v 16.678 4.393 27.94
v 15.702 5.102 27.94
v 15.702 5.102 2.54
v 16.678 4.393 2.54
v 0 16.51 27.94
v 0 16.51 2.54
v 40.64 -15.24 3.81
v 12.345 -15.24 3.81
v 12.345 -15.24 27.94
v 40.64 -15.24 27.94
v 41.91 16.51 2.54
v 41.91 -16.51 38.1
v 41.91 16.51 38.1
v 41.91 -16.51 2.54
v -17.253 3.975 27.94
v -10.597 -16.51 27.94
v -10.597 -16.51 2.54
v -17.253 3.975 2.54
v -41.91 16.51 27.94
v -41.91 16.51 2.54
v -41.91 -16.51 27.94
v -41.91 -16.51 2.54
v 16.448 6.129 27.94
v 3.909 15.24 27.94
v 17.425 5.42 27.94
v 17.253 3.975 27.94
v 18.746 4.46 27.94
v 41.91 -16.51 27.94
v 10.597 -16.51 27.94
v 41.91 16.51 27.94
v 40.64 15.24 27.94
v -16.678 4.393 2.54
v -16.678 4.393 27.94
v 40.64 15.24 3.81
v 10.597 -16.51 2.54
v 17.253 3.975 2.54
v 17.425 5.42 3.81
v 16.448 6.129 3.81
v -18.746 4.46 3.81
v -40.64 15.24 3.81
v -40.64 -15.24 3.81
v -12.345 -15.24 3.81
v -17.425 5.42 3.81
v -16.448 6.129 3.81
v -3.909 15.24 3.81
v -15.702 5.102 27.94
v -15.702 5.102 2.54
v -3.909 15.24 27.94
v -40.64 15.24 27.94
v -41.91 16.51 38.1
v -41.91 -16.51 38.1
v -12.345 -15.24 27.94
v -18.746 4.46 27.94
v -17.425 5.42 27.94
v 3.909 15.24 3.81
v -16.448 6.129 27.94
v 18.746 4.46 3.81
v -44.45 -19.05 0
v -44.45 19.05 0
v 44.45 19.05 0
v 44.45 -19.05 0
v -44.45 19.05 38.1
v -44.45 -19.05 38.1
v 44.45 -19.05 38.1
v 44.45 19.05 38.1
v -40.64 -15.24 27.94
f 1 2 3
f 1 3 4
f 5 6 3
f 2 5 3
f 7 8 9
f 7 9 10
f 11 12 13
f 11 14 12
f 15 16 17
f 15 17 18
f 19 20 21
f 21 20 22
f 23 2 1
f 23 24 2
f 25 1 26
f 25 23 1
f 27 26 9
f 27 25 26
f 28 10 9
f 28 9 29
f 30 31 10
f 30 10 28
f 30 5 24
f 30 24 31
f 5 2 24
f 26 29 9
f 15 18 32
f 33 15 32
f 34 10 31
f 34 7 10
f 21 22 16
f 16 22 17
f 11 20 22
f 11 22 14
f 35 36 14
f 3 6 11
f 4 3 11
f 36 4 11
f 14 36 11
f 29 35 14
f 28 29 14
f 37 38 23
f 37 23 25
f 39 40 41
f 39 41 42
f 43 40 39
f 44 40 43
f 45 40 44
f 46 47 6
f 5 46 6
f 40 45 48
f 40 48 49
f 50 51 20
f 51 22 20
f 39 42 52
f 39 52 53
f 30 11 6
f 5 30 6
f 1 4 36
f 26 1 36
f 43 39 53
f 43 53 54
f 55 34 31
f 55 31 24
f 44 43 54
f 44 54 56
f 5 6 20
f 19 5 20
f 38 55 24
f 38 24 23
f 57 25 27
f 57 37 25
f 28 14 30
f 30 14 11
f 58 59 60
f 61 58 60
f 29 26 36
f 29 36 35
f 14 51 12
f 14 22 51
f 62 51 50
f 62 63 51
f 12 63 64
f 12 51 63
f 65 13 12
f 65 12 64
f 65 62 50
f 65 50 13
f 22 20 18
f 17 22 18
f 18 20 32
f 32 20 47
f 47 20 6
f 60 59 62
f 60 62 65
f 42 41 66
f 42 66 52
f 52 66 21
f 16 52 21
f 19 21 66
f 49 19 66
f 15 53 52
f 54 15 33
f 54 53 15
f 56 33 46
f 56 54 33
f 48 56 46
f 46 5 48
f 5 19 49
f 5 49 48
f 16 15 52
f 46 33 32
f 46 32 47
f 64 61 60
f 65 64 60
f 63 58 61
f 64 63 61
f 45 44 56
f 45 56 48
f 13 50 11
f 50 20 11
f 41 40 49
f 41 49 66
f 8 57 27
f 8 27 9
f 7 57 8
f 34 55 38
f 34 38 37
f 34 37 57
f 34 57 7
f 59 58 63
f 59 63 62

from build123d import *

# Parameters (mm, degrees)
F0_W     = 88.9
F0_H     = 38.1
F1_DEPTH = 38.1
F2_T     = -2.54
F4_DEPTH = 25.4
F5_T     = -1.27
F6_T     = -1.27


with BuildPart() as f1:
    # F0 (on Top) → F1 (new body)
    with BuildSketch(Plane.XY):
        Rectangle(F0_W, F0_H)
    extrude(amount=F1_DEPTH)

    # F2
    f2_openings = [f1.faces().sort_by_distance(p)[0] for p in [
        (0, 0, 38.1),
    ]]
    offset(amount=F2_T, openings=f2_openings)


with BuildPart() as f4:
    # F3 (on face) → F4 (new body)
    with BuildSketch(Plane.XY.offset(2.54)):
        Polygon((-15.701943084, 5.1018705771), (0, 16.51), (-41.91, 16.51), (-41.91, -16.51), (-10.5966423781, -16.51), (-17.2526844283, 3.9751910406), (-16.6781271043, 4.3926313713), align=None)
    extrude(amount=F4_DEPTH)

    # F5
    f5_openings = [f4.faces().sort_by_distance(p)[0] for p in [
        (-26.606347, 0.679846, 27.94),
    ]]
    offset(amount=F5_T, openings=f5_openings, kind=Kind.INTERSECTION)


with BuildPart() as f4b:
    # F3 (on face) → F4, piece 2 (new body)
    with BuildSketch(Plane.XY.offset(2.54)):
        Polygon((41.91, 16.51), (0, 16.51), (15.701943084, 5.1018705771), (16.6781271043, 4.3926313713), (17.2526844283, 3.9751910406), (10.5966423781, -16.51), (41.91, -16.51), align=None)
    extrude(amount=F4_DEPTH)

    # F6
    f6_openings = [f4b.faces().sort_by_distance(p)[0] for p in [
        (26.606347, 0.679846, 27.94),
    ]]
    offset(amount=F6_T, openings=f6_openings, kind=Kind.INTERSECTION)


solid = Compound([f1.part, f4.part, f4b.part])
